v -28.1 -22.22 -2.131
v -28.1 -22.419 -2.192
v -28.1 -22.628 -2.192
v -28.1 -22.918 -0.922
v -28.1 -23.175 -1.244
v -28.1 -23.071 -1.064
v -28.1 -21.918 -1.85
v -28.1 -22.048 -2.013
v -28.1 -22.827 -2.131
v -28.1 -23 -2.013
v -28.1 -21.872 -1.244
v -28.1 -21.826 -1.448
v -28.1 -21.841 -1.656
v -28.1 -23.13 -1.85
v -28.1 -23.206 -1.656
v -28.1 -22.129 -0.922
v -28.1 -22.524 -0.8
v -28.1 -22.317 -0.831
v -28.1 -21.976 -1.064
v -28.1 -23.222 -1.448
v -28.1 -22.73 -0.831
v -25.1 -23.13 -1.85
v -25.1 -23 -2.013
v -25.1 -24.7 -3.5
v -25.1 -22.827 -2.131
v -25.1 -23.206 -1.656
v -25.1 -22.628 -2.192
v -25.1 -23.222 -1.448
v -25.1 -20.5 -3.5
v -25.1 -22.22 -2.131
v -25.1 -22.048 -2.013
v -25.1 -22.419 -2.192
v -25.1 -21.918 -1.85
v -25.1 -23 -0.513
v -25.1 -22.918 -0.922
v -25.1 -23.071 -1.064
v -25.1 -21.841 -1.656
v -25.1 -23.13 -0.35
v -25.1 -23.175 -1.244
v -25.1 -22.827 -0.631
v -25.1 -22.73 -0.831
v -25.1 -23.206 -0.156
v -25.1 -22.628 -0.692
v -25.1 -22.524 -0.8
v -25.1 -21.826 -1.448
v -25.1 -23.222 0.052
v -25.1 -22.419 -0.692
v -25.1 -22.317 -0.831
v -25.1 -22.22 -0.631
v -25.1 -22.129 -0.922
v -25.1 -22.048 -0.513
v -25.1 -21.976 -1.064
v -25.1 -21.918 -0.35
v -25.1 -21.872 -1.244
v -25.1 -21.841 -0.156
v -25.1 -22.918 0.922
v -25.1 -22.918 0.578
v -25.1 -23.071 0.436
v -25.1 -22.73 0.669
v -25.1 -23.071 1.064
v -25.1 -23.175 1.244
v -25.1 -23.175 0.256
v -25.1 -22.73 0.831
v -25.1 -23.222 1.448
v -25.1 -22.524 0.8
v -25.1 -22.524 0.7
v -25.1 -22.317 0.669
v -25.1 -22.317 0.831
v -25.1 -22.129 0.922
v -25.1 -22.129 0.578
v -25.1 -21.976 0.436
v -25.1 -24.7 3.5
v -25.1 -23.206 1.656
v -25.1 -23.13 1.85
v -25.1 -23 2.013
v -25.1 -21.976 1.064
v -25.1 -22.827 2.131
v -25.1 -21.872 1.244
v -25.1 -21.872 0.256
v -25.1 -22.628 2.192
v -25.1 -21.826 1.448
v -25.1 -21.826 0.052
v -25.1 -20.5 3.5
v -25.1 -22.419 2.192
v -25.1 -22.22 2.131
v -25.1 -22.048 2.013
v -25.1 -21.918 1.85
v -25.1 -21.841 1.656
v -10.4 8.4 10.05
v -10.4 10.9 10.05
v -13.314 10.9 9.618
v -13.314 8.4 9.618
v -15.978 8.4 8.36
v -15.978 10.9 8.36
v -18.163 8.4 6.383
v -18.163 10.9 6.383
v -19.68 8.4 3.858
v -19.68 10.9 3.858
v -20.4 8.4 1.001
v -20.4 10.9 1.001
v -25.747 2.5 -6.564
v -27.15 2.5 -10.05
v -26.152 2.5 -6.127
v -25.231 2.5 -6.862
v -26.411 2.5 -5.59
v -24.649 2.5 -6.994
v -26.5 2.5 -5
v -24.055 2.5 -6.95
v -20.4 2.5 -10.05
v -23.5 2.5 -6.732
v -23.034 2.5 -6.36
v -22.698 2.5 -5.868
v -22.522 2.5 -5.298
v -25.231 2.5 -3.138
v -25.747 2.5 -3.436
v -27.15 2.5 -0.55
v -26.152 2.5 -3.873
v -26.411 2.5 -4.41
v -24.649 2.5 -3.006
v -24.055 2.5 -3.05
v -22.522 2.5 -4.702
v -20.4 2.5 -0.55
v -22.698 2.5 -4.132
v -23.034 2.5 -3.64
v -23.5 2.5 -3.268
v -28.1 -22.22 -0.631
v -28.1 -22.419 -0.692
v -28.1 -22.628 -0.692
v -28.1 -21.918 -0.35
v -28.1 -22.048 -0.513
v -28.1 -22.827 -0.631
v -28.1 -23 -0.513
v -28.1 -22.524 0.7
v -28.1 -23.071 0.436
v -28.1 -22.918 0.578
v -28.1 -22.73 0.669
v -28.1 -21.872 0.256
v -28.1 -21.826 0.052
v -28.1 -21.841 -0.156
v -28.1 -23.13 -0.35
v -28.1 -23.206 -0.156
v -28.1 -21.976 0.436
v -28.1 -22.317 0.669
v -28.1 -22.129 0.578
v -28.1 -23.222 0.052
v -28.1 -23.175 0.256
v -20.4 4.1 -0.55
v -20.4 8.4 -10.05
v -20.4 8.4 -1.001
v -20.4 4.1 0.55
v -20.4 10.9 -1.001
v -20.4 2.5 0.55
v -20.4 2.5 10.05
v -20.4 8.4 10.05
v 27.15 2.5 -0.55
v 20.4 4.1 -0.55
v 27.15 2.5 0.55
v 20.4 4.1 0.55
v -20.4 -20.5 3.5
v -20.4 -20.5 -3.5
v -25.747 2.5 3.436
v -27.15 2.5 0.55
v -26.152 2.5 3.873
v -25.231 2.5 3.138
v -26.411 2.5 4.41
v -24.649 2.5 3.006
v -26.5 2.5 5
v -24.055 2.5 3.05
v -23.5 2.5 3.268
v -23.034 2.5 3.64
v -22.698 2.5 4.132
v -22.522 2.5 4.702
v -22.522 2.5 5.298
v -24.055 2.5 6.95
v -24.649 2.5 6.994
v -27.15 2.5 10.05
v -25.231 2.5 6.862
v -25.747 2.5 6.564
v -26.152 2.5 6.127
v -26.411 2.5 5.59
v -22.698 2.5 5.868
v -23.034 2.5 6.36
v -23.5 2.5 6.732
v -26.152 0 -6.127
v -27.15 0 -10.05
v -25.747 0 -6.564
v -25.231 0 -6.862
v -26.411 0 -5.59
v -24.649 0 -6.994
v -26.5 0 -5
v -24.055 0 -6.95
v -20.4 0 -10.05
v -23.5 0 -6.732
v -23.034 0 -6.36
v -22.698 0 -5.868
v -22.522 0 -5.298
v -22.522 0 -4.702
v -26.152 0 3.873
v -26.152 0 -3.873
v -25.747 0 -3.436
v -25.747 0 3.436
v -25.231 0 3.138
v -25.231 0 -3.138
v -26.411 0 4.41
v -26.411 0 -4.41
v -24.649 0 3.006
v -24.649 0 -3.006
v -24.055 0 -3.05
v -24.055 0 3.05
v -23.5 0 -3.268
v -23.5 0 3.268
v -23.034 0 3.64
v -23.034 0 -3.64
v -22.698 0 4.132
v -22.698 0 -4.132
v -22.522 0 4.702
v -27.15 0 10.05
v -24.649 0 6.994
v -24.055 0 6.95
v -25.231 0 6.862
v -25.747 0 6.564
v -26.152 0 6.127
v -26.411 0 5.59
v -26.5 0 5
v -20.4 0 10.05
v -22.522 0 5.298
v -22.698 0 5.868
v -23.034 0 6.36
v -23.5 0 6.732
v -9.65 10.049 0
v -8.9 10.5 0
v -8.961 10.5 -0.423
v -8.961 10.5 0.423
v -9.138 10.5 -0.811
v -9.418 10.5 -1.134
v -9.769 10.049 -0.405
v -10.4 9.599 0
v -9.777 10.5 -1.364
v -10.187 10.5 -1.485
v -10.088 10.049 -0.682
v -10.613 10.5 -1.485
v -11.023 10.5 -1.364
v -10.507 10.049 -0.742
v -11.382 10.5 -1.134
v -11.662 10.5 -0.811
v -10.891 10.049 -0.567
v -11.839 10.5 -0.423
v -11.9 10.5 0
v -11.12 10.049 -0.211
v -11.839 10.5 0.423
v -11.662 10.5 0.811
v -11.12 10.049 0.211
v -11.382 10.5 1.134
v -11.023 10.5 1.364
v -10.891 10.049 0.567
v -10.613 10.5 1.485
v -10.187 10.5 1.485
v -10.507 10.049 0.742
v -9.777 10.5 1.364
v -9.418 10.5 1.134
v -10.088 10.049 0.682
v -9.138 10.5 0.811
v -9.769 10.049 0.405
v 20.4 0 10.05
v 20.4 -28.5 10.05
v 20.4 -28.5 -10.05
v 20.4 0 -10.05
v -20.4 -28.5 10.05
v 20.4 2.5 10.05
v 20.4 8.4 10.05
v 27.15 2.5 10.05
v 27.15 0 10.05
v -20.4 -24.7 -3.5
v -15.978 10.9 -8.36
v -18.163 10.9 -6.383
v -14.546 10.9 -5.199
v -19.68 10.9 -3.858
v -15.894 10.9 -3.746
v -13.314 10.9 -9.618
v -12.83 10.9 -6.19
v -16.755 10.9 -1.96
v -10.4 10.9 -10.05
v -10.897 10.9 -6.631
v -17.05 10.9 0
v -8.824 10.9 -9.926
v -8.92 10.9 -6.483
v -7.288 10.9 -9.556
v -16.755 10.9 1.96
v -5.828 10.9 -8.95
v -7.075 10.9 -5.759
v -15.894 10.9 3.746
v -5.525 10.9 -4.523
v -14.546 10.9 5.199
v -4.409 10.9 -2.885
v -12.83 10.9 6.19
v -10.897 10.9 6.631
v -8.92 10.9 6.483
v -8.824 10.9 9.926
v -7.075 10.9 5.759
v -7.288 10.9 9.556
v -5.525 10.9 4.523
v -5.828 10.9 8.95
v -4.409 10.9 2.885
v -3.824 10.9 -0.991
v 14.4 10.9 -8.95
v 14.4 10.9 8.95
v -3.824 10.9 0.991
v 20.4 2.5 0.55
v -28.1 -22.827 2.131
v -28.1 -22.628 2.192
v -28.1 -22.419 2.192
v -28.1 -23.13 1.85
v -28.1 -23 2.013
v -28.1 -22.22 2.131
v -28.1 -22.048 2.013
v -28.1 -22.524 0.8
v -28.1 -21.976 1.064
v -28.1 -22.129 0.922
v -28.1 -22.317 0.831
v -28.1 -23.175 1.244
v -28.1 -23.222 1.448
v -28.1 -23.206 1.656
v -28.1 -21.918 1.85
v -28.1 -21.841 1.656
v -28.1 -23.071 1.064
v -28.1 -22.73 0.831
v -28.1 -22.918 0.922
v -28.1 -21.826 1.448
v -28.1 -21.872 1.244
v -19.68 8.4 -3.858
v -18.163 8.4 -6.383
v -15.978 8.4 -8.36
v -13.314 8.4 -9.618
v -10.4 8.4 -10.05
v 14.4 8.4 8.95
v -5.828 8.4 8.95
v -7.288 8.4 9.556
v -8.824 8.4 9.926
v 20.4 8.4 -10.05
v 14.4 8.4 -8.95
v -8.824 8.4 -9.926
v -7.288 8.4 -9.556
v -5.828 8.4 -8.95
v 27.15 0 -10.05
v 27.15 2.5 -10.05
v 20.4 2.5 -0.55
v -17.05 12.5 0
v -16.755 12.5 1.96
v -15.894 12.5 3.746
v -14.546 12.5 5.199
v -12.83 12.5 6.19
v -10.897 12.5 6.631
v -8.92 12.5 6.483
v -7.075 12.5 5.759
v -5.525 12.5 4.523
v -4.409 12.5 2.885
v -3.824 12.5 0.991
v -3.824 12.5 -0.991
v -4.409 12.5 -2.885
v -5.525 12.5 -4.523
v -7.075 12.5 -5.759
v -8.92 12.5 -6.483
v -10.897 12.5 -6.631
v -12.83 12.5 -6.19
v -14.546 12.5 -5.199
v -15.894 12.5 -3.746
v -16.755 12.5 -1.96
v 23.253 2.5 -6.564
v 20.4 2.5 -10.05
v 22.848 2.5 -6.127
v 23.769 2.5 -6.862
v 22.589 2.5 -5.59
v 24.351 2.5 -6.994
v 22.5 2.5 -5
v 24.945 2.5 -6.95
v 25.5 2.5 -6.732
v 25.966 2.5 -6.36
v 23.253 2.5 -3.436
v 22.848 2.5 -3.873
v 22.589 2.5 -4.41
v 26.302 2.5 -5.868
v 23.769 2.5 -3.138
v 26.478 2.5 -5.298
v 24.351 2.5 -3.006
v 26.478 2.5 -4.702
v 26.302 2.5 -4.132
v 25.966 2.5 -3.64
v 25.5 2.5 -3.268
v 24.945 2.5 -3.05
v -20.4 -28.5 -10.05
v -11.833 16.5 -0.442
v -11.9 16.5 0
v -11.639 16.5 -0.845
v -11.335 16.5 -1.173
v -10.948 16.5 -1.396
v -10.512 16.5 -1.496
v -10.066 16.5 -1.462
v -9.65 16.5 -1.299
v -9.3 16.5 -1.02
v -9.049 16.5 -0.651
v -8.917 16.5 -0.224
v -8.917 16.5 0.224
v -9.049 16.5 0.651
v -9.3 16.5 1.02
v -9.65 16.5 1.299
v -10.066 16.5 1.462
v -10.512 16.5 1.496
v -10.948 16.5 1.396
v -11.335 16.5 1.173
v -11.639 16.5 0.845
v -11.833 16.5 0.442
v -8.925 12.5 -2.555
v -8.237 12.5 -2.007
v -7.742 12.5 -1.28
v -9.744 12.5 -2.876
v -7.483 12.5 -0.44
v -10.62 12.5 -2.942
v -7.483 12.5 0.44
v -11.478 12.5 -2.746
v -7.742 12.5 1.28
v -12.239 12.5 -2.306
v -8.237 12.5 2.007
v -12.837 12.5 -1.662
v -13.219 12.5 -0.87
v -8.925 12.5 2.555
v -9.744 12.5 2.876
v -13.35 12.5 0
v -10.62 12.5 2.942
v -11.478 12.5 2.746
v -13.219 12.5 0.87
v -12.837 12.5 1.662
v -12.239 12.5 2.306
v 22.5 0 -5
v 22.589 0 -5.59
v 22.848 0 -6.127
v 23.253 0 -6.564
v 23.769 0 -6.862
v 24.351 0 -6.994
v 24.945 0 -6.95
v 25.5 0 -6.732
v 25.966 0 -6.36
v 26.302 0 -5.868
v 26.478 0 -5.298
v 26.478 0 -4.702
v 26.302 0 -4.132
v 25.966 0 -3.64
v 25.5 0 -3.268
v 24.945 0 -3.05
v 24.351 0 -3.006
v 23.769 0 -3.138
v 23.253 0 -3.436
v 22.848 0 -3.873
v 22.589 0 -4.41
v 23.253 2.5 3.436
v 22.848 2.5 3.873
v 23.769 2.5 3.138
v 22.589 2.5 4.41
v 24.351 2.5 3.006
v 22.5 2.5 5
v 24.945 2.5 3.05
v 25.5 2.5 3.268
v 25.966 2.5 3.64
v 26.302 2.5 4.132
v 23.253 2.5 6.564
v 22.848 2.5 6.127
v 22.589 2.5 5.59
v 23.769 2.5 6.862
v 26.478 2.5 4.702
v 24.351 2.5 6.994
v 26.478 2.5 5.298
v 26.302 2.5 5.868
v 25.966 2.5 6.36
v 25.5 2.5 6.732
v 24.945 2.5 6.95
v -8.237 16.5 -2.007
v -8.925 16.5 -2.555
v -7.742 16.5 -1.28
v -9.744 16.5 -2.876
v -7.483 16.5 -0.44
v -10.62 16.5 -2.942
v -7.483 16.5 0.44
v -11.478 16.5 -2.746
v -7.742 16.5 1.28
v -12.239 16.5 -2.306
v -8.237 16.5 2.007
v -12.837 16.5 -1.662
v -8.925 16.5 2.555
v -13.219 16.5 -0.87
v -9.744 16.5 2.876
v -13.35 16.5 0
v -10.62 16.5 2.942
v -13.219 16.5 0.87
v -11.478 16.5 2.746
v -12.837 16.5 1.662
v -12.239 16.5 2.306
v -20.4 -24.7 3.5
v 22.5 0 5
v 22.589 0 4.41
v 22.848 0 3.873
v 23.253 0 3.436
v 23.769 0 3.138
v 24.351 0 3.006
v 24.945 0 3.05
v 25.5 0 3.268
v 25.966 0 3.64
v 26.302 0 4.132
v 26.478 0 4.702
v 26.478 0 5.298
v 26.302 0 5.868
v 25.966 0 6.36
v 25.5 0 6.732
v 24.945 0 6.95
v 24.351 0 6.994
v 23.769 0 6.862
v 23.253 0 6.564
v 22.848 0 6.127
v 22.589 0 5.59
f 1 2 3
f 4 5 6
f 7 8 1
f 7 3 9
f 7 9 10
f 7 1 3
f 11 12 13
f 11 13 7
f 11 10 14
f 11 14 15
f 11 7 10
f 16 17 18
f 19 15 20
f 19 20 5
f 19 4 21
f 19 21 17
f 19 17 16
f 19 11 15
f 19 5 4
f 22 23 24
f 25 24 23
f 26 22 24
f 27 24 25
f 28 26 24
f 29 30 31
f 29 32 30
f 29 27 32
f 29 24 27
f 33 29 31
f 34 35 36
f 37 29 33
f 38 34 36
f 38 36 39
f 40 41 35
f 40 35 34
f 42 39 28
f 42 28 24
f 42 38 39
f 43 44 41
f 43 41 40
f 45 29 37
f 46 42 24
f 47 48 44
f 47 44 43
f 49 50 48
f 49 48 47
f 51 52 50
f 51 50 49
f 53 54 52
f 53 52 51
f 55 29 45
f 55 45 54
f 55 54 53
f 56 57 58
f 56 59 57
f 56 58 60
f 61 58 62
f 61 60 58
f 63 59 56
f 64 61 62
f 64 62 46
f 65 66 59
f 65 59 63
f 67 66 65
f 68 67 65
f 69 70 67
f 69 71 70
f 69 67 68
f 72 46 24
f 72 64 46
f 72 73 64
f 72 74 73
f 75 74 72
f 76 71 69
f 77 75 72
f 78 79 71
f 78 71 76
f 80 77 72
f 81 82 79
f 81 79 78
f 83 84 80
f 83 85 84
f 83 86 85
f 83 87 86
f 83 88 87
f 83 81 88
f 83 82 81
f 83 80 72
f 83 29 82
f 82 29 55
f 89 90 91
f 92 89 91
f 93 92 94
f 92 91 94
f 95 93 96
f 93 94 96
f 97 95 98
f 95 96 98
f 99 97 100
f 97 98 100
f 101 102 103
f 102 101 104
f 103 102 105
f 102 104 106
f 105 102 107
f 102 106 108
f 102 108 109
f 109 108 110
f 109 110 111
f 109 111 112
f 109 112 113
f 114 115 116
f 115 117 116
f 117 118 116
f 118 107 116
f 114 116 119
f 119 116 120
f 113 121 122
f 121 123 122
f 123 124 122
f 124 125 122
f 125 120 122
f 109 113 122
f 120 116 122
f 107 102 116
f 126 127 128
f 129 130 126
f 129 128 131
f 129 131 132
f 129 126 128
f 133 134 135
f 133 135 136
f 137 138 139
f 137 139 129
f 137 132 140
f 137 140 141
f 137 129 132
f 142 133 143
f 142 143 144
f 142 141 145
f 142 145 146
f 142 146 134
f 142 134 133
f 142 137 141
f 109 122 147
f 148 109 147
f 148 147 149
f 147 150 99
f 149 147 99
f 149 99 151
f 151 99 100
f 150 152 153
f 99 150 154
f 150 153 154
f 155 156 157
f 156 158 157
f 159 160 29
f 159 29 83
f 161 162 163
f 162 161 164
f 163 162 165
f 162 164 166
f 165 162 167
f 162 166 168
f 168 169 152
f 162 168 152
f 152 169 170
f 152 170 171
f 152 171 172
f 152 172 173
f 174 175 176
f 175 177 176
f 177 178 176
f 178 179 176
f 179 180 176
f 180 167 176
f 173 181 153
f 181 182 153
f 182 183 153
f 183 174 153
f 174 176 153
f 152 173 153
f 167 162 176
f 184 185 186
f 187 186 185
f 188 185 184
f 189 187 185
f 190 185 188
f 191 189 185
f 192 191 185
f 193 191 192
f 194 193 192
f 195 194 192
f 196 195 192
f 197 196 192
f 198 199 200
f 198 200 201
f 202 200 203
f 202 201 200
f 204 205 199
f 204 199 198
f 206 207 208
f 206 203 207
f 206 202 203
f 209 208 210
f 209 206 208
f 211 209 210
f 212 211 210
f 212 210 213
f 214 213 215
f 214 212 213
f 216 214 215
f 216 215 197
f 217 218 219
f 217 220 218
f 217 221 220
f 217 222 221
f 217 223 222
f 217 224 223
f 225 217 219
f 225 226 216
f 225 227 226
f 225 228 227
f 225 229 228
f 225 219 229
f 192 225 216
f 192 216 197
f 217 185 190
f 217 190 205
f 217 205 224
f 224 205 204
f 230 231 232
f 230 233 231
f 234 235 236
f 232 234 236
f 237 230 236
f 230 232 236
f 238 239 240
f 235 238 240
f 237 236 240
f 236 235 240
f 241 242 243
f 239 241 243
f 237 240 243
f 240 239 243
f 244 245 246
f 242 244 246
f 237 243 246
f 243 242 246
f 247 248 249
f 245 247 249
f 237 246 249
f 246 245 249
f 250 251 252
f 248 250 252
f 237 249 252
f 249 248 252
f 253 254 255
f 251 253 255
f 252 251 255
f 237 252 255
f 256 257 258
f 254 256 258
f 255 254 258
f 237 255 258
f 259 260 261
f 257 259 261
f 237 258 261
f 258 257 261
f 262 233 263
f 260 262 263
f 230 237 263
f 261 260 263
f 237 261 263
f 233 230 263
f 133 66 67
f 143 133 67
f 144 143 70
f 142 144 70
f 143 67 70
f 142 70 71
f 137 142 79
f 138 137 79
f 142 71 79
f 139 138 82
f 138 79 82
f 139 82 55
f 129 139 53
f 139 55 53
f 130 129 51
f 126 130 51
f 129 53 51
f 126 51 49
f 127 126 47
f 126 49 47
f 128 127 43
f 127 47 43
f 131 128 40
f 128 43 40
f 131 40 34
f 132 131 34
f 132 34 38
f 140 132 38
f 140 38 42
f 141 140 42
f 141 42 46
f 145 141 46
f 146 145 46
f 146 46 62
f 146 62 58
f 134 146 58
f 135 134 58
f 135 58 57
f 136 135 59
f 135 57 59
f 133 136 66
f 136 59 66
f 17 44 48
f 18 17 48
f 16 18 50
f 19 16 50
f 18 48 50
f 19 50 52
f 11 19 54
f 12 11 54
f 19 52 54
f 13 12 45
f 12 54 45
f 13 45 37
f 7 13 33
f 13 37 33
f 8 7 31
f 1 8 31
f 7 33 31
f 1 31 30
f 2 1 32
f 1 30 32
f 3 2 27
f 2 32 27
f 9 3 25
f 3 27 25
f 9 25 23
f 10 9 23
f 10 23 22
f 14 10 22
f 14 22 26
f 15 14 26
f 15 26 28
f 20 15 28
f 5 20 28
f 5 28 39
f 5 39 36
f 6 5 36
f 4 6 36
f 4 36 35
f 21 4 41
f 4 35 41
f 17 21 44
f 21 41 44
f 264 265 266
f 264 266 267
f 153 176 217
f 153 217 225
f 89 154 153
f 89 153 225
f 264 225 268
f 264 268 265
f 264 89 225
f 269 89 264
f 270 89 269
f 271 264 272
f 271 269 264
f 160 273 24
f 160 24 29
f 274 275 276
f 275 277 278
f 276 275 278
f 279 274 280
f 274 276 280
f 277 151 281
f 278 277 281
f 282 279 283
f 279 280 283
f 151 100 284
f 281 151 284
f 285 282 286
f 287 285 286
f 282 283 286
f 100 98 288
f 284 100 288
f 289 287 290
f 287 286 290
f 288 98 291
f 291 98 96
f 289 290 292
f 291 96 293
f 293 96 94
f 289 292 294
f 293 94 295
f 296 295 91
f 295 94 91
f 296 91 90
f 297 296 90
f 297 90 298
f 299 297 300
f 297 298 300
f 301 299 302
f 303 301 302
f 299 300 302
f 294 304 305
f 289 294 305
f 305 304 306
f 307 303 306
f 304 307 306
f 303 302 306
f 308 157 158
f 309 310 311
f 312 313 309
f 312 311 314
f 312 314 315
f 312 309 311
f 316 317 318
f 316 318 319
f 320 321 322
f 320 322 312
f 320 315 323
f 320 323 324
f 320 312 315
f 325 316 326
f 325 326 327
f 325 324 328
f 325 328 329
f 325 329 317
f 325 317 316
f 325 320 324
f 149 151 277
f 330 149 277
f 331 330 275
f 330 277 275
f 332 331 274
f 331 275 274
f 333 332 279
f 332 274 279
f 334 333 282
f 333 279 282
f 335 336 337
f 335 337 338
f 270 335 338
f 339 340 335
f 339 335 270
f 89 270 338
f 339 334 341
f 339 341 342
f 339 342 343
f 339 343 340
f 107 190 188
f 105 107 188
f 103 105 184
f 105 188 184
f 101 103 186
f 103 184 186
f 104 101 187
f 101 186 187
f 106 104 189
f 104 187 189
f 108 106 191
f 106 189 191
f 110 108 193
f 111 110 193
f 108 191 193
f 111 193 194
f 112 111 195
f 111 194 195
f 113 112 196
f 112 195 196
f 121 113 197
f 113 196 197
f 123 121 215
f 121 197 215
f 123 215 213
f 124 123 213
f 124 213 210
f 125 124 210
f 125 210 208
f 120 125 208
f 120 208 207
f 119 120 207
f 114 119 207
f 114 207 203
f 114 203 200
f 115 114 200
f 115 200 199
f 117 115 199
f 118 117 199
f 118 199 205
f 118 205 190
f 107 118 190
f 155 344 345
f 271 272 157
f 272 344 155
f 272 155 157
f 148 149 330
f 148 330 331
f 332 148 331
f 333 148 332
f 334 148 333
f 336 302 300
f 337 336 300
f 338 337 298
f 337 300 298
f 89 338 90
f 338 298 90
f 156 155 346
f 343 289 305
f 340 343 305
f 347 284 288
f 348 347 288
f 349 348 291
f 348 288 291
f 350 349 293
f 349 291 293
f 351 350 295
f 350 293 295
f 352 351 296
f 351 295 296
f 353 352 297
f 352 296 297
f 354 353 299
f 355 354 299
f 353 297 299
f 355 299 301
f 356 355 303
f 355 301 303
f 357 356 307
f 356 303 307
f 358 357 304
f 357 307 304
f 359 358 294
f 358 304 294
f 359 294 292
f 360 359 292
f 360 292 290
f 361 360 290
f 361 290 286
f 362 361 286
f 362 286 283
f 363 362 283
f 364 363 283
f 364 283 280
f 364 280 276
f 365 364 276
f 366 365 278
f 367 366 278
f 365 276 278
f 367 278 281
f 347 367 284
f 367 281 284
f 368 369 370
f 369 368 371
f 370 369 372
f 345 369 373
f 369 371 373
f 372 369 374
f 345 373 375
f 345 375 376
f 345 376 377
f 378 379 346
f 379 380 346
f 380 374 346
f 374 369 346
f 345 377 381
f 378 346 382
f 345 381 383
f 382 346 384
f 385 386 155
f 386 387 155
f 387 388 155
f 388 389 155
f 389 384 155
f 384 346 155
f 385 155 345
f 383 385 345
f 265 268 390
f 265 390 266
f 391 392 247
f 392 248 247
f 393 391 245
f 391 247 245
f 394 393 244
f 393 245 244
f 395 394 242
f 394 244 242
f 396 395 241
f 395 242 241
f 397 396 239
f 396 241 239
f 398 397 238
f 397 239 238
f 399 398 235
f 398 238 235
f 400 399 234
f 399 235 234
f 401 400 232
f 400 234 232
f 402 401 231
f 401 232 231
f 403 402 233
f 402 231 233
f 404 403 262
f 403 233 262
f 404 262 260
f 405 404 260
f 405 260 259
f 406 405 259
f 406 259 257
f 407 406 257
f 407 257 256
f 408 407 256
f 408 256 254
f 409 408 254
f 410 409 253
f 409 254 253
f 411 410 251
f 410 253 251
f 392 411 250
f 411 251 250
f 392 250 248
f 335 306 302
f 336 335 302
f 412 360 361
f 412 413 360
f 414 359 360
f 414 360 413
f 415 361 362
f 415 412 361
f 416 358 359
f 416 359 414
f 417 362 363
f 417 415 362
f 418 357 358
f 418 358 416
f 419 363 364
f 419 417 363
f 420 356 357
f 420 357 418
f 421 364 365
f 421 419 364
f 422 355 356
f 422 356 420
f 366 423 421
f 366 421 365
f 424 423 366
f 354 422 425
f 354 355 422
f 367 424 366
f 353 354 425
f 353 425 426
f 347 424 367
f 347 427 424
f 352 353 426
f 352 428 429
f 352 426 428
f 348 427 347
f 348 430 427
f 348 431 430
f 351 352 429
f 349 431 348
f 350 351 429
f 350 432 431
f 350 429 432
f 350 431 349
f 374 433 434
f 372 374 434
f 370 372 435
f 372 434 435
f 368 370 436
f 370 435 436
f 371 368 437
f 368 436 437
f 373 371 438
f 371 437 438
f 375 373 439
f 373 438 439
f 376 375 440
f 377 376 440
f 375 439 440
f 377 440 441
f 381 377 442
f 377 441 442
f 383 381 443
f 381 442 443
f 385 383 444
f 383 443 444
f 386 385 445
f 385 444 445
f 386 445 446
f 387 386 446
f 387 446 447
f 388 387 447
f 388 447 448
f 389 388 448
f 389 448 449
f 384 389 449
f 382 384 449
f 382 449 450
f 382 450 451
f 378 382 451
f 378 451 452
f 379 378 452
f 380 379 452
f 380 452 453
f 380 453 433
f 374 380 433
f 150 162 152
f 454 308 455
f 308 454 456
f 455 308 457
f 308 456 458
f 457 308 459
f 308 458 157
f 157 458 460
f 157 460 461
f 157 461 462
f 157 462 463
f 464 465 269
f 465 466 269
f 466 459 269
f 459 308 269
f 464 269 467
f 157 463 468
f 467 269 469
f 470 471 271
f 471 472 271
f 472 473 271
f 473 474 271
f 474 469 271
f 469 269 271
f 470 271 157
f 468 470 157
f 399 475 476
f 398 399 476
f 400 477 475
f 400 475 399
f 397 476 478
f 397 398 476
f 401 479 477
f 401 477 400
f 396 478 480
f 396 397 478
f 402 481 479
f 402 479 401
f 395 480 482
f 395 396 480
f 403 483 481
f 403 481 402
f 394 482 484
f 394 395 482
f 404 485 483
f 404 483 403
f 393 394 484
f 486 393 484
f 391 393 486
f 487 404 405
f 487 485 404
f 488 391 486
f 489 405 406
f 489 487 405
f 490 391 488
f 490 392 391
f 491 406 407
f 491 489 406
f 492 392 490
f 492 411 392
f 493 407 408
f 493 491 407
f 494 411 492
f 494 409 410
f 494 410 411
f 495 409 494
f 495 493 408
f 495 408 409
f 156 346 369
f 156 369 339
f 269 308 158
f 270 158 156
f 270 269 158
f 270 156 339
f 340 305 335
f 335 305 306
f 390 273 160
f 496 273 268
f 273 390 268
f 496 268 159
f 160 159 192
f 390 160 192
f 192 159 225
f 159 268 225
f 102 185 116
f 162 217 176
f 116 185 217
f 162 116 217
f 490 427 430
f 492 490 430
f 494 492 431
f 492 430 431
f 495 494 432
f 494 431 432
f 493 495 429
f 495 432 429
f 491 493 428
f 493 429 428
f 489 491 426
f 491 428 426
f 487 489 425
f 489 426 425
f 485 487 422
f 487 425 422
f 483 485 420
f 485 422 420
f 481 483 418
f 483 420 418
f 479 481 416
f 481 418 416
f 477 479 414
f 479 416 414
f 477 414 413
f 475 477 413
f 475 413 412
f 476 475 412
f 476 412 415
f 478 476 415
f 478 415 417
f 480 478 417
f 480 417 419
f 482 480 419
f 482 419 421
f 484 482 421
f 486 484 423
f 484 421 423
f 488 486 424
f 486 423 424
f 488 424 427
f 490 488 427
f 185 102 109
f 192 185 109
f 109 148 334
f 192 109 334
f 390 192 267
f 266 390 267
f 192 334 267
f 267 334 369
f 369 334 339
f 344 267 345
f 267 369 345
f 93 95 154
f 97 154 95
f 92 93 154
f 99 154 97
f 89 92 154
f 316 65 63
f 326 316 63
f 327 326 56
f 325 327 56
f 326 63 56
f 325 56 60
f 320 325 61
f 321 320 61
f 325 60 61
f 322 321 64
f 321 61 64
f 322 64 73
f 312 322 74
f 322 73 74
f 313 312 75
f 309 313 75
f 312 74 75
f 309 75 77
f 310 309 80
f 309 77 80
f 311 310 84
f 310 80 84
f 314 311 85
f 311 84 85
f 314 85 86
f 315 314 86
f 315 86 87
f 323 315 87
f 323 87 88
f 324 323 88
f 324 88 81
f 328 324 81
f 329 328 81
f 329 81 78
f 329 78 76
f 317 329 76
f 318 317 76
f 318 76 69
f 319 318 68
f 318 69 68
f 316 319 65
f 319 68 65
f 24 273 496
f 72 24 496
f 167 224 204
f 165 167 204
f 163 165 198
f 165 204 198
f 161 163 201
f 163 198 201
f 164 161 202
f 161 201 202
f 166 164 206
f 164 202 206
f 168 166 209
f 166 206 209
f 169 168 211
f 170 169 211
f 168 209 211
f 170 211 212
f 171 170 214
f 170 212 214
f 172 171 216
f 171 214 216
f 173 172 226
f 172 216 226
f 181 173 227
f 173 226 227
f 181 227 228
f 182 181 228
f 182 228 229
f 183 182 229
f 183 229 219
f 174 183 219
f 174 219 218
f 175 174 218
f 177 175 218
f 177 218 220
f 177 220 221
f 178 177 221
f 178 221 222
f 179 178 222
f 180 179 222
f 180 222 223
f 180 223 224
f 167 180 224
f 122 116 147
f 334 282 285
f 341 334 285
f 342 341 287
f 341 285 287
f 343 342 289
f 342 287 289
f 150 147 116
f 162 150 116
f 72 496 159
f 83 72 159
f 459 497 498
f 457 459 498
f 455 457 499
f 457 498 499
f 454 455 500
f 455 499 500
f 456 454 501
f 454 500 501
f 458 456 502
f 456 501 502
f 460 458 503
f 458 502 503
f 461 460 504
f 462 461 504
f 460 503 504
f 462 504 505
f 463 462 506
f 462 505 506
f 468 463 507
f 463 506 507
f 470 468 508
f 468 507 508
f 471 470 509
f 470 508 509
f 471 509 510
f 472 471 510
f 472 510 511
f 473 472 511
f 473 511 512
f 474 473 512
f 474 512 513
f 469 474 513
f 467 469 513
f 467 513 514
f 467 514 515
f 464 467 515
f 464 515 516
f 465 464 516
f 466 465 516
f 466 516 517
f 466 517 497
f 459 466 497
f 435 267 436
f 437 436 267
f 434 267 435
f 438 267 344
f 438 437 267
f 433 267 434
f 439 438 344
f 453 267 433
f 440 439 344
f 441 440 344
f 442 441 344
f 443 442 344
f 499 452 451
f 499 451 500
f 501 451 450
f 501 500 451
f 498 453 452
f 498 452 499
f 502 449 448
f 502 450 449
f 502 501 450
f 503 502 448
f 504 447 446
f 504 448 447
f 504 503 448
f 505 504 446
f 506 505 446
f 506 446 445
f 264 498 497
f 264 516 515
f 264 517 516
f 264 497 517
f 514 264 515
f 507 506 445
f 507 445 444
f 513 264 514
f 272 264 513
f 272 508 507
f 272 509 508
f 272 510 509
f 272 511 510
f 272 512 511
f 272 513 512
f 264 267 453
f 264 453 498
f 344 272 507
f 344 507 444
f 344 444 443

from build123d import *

# Parameters (mm, degrees)
ESQUISSE1_W                       = 40.8
ESQUISSE1_H                       = 39.4
ESQUISSE1_W_2                     = 6.75
ESQUISSE1_H_2                     = 2.5
BOSS_EXTRU_1_DEPTH                = 10.05
DIAM_TRE_DU_PER_AGE_4_0_4_1_D     = 4
BOSS_EXTRU_3_DEPTH                = 0.55
ESQUISSE6_R                       = 6.65
BOSS_EXTRU_4_DEPTH                = 1.6
ESQUISSE4_R                       = 2.95
BOSS_EXTRU_2_DEPTH                = 4
DIAM_TRE_DU_PER_AGE_3_0_3_1_D     = 3
DIAM_TRE_DU_PER_AGE_3_0_3_1_DEPTH = 6
DIAM_TRE_DU_PER_AGE_3_0_3_1_TIP   = 0.901290929
ENL_V_MAT_EXTRU_1_DEPTH           = 2.5
ESQUISSE8_W                       = 7
ESQUISSE8_H                       = 4.2
BOSS_EXTRU_5_DEPTH                = 4.7
ESQUISSE9_R                       = 0.7
BOSS_EXTRU_6_DEPTH                = 3


with BuildPart() as part:
    # Esquisse1 → Boss.-Extru.1 (new, symmetric)
    with BuildSketch(Plane.XY):
        with Locations((0, -8.8)):
            Rectangle(ESQUISSE1_W, ESQUISSE1_H)
        with Locations((-23.775, 1.25)):
            Rectangle(ESQUISSE1_W_2, ESQUISSE1_H_2)
        with Locations((23.775, 1.25)):
            Rectangle(ESQUISSE1_W_2, ESQUISSE1_H_2)
    extrude(amount=BOSS_EXTRU_1_DEPTH, both=True)

    # Diamètre du perçage Ø4.0 (4)1 (through all)
    with Locations(Plane(origin=(0, 2.5, 0), x_dir=(1, 0, 0), z_dir=(0, 1, 0))):
        with Locations((-24.5, 5), (24.5, 5), (24.5, -5), (-24.5, -5)):
            Hole(DIAM_TRE_DU_PER_AGE_4_0_4_1_D / 2)

    # Esquisse5 → Boss.-Extru.3 (add, symmetric)
    with BuildSketch(Plane.XY):
        Polygon((-20.4, 4.1), (-27.15, 2.5), (-20.4, 2.5), align=None)
        Polygon((20.4, 2.5), (20.4, 4.1), (27.15, 2.5), align=None)
    extrude(amount=BOSS_EXTRU_3_DEPTH, both=True)

    # Esquisse6 → Boss.-Extru.4 (add)
    with BuildSketch(Plane(origin=(0, 10.9, 0), x_dir=(1, 0, 0), z_dir=(0, 1, 0))):
        with Locations(Location((-10.4, 0, 0), (0, 0, 180))):
            Circle(ESQUISSE6_R)
    extrude(amount=BOSS_EXTRU_4_DEPTH)

    # Esquisse4 → Boss.-Extru.2 (add)
    with BuildSketch(Plane(origin=(0, 12.5, 0), x_dir=(1, 0, 0), z_dir=(0, 1, 0))):
        with Locations(Location((-10.4, 0, 0), (0, 0, 180))):
            Circle(ESQUISSE4_R)
    extrude(amount=BOSS_EXTRU_2_DEPTH)

    # Diamètre du perçage Ø3.0 (3)1
    with Locations(Plane(origin=(0, 16.5, 0), x_dir=(1, 0, 0), z_dir=(0, 1, 0))):
        with Locations((-10.4, 0)):
            Hole(DIAM_TRE_DU_PER_AGE_3_0_3_1_D / 2, depth=DIAM_TRE_DU_PER_AGE_3_0_3_1_DEPTH)
            with Locations((0, 0, -(DIAM_TRE_DU_PER_AGE_3_0_3_1_DEPTH + DIAM_TRE_DU_PER_AGE_3_0_3_1_TIP / 2))):  # 118° drill point
                Cone(0, DIAM_TRE_DU_PER_AGE_3_0_3_1_D / 2, DIAM_TRE_DU_PER_AGE_3_0_3_1_TIP, mode=Mode.SUBTRACT)

    # Esquisse7 → Enlèv. mat.-Extru.1 (cut)
    with BuildSketch(Plane(origin=(0, 10.9, 0), x_dir=(1, 0, 0), z_dir=(0, 1, 0))):
        with BuildLine():
            ThreePointArc((-20.4, 1.00124922), (-17.143142641, 7.452014984), (-10.4, 10.05))
            Line((-10.4, 10.05), (-20.4, 10.05))
            Line((-20.4, 10.05), (-20.4, 1.00124922))
        make_face()
        with BuildLine():
            Line((-20.4, -10.05), (-10.4, -10.05))
            ThreePointArc((-10.4, -10.05), (-17.143142641, -7.452014984), (-20.4, -1.00124922))
            Line((-20.4, -1.00124922), (-20.4, -10.05))
        make_face()
        with BuildLine():
            ThreePointArc((-10.4, 10.05), (-8.048936411, 9.771130948), (-5.82834822, 8.95))
            Line((-5.82834822, 8.95), (14.4, 8.95))
            Line((14.4, 8.95), (14.4, -8.95))
            Line((14.4, -8.95), (-5.82834822, -8.95))
            ThreePointArc((-5.82834822, -8.95), (-8.048936411, -9.771130948), (-10.4, -10.05))
            Line((-10.4, -10.05), (20.4, -10.05))
            Line((20.4, -10.05), (20.4, 10.05))
            Line((20.4, 10.05), (-10.4, 10.05))
        make_face()
    extrude(amount=-ENL_V_MAT_EXTRU_1_DEPTH, mode=Mode.SUBTRACT)

    # Esquisse8 → Boss.-Extru.5 (add)
    with BuildSketch(Plane.ZY.offset(20.4)):
        with Locations((0, -22.6)):
            Rectangle(ESQUISSE8_W, ESQUISSE8_H)
    extrude(amount=BOSS_EXTRU_5_DEPTH)

    # Esquisse9 → Boss.-Extru.6 (add)
    with BuildSketch(Plane.ZY.offset(25.1)):
        with Locations((-1.5, -22.523764429)):
            Circle(ESQUISSE9_R)
        with Locations((0, -22.523764429)):
            Circle(ESQUISSE9_R)
        with Locations(Location((1.5, -22.523764429, 0), (0, 0, 180))):
            Circle(ESQUISSE9_R)
    extrude(amount=BOSS_EXTRU_6_DEPTH)


solid = part.part
